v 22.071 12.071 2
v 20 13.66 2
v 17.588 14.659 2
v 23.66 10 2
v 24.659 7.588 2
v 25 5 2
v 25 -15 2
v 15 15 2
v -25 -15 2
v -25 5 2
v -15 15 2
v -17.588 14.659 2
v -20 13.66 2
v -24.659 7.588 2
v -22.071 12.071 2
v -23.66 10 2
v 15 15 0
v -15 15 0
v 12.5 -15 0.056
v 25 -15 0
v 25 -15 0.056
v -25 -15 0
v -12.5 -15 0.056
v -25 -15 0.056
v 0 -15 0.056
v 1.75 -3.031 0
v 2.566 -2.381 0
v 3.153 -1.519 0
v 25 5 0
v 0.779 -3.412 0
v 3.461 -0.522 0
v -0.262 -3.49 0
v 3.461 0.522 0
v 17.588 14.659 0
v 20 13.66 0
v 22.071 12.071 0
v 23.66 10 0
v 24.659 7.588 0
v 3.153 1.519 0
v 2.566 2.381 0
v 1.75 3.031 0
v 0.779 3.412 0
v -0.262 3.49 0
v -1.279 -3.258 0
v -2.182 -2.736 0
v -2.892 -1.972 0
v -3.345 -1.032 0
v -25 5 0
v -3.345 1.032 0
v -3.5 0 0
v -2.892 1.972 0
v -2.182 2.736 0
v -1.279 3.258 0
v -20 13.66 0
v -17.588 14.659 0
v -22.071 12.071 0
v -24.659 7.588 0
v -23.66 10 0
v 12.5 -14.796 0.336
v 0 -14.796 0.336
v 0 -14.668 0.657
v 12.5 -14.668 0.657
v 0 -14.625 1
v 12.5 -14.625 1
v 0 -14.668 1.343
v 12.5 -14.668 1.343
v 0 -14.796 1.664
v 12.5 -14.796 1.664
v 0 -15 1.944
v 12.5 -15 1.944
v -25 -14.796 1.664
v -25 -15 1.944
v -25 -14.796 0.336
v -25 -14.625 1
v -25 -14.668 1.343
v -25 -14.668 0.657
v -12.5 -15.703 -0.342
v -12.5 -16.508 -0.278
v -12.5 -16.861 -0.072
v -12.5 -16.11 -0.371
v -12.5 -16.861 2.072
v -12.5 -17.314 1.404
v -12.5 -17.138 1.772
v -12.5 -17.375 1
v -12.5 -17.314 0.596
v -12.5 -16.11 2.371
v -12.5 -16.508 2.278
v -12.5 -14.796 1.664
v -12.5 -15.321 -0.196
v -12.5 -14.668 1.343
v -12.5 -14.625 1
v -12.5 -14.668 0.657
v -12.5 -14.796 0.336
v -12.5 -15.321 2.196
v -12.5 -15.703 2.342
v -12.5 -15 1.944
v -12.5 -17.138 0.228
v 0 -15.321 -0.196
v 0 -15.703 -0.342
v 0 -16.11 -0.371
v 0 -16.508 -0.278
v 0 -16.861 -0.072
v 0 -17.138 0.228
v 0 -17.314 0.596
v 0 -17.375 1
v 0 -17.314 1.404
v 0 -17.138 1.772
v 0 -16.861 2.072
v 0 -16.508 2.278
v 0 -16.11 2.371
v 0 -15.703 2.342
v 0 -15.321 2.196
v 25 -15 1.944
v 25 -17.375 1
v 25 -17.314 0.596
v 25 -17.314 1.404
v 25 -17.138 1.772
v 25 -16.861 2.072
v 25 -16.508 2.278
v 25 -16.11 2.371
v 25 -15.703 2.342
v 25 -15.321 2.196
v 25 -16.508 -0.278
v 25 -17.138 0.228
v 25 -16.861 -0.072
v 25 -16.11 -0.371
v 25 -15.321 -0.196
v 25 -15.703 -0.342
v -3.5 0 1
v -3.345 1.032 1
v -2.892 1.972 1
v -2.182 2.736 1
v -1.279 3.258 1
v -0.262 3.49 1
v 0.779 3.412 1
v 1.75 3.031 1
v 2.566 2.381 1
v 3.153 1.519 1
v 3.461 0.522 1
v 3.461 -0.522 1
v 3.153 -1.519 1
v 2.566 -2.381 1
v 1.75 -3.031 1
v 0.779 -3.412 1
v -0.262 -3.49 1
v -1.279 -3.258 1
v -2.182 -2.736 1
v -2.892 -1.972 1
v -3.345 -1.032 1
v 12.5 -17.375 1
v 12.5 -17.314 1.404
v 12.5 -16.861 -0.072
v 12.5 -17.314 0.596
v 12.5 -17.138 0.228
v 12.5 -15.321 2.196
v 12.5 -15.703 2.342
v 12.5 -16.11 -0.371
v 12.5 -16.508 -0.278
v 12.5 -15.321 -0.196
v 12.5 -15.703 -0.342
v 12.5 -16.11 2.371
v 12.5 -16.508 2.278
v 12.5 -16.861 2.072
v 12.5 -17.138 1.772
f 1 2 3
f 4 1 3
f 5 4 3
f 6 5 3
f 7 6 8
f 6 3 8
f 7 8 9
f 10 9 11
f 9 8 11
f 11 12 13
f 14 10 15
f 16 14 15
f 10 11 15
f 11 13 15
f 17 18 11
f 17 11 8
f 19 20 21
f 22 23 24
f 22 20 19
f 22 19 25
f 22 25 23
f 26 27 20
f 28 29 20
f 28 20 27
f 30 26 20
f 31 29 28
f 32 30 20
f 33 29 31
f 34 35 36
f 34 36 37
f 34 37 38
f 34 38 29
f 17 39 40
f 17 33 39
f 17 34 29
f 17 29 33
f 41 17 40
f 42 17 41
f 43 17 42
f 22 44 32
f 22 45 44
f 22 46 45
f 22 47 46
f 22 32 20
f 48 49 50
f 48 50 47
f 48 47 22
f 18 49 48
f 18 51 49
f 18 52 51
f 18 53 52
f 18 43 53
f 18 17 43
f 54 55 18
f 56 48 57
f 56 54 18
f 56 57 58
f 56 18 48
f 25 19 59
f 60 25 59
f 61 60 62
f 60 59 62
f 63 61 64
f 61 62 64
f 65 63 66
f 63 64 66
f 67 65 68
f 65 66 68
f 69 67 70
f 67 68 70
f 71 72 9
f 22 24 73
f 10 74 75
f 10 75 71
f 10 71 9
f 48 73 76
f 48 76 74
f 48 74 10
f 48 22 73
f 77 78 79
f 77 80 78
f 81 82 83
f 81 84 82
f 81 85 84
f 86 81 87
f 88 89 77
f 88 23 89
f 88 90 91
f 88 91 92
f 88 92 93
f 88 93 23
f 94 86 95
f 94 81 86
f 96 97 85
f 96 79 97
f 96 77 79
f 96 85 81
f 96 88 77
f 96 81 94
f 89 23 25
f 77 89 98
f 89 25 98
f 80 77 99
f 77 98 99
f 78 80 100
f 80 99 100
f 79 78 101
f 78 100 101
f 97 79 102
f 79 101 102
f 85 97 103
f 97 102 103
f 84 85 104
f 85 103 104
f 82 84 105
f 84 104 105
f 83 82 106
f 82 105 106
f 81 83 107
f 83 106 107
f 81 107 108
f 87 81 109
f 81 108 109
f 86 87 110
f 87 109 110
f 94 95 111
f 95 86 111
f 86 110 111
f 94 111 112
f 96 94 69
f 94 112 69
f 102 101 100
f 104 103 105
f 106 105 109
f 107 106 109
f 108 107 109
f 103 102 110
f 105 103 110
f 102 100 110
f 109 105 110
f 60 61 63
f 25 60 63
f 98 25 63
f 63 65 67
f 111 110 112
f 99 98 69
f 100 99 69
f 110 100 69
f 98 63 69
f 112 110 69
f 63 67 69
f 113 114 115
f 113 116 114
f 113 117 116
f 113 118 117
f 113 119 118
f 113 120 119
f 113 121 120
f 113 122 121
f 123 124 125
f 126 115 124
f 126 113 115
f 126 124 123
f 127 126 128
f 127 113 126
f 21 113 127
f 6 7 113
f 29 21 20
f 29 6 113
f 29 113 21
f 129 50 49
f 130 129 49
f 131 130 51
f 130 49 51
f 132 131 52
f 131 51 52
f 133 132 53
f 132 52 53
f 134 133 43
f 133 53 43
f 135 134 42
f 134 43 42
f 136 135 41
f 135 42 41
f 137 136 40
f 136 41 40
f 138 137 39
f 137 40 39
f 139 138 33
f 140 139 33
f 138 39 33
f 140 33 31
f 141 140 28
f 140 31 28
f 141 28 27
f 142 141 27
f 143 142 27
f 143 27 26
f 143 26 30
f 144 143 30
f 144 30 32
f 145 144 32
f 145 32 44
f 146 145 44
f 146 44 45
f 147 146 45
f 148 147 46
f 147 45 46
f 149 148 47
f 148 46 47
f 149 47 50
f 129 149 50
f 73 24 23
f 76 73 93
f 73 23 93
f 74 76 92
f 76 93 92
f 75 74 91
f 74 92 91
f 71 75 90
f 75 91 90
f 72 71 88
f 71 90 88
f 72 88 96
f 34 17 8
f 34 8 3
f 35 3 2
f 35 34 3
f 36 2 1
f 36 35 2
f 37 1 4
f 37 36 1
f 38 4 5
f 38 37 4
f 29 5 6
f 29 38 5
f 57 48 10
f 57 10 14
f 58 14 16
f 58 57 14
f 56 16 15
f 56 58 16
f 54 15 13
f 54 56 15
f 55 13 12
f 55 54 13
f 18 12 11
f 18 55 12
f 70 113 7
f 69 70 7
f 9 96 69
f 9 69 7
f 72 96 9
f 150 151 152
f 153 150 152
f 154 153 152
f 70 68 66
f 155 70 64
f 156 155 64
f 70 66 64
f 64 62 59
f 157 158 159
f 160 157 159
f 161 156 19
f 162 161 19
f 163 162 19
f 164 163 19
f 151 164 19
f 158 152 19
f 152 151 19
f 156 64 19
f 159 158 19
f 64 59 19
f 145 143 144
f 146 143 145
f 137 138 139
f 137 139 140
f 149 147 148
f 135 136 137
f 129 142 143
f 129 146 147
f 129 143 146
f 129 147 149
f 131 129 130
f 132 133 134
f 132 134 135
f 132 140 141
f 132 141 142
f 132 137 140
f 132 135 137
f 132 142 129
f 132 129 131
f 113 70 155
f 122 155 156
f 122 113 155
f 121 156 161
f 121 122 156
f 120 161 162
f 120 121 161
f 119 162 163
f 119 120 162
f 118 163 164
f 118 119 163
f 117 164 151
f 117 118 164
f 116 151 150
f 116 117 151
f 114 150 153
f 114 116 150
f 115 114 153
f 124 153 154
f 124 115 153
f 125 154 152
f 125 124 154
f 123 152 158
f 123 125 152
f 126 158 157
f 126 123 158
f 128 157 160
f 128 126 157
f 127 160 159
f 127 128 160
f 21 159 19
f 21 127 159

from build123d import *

# Parameters (mm, degrees)
BOSS_EXTRUDE1_DEPTH = 2
SKETCH3_R           = 1.375
CUT_EXTRUDE1_DEPTH  = 50
SKETCH3_2_R         = 1.375
BOSS_EXTRUDE2_DEPTH = 12.5
SKETCH5_R           = 1.375
BOSS_EXTRUDE3_DEPTH = 12.5
SKETCH7_R           = 3.5
CUT_EXTRUDE2_DEPTH  = 1


with BuildPart() as part:
    # Sketch1 → Boss-Extrude1 (new body)
    with BuildSketch(Plane.XY):
        with BuildLine():
            Line((-15, 15), (15, 15))
            ThreePointArc((15, 15), (22.071067812, 12.071067812), (25, 5))
            Line((25, 5), (25, -15))
            Line((25, -15), (-25, -15))
            Line((-25, -15), (-25, 5))
            ThreePointArc((-25, 5), (-22.071067812, 12.071067812), (-15, 15))
        make_face()
    extrude(amount=BOSS_EXTRUDE1_DEPTH)

    # Sketch3 → Cut-Extrude1 (cut)
    with BuildSketch(Plane(origin=(25, 0, 0), x_dir=(0, 0, -1), z_dir=(1, 0, 0))):
        with Locations((-1, -16)):
            Circle(SKETCH3_R)
    extrude(amount=-CUT_EXTRUDE1_DEPTH, mode=Mode.SUBTRACT)

    # Sketch3<2> → Boss-Extrude2 (add)
    with BuildSketch(Plane(origin=(25, 0, 0), x_dir=(0, 0, -1), z_dir=(1, 0, 0))):
        with Locations((-1, -16)):
            Circle(SKETCH3_2_R)
    extrude(amount=-BOSS_EXTRUDE2_DEPTH)

    # Sketch5 → Boss-Extrude3 (add)
    with BuildSketch(Plane.ZY):
        with Locations((1, -16)):
            Circle(SKETCH5_R)
    extrude(amount=BOSS_EXTRUDE3_DEPTH)

    # Sketch7 → Cut-Extrude2 (cut)
    with BuildSketch(Plane(origin=(0, 0, 0), x_dir=(-1, 0, 0), z_dir=(0, 0, -1))):
        Circle(SKETCH7_R)
    extrude(amount=-CUT_EXTRUDE2_DEPTH, mode=Mode.SUBTRACT)


solid = part.part
